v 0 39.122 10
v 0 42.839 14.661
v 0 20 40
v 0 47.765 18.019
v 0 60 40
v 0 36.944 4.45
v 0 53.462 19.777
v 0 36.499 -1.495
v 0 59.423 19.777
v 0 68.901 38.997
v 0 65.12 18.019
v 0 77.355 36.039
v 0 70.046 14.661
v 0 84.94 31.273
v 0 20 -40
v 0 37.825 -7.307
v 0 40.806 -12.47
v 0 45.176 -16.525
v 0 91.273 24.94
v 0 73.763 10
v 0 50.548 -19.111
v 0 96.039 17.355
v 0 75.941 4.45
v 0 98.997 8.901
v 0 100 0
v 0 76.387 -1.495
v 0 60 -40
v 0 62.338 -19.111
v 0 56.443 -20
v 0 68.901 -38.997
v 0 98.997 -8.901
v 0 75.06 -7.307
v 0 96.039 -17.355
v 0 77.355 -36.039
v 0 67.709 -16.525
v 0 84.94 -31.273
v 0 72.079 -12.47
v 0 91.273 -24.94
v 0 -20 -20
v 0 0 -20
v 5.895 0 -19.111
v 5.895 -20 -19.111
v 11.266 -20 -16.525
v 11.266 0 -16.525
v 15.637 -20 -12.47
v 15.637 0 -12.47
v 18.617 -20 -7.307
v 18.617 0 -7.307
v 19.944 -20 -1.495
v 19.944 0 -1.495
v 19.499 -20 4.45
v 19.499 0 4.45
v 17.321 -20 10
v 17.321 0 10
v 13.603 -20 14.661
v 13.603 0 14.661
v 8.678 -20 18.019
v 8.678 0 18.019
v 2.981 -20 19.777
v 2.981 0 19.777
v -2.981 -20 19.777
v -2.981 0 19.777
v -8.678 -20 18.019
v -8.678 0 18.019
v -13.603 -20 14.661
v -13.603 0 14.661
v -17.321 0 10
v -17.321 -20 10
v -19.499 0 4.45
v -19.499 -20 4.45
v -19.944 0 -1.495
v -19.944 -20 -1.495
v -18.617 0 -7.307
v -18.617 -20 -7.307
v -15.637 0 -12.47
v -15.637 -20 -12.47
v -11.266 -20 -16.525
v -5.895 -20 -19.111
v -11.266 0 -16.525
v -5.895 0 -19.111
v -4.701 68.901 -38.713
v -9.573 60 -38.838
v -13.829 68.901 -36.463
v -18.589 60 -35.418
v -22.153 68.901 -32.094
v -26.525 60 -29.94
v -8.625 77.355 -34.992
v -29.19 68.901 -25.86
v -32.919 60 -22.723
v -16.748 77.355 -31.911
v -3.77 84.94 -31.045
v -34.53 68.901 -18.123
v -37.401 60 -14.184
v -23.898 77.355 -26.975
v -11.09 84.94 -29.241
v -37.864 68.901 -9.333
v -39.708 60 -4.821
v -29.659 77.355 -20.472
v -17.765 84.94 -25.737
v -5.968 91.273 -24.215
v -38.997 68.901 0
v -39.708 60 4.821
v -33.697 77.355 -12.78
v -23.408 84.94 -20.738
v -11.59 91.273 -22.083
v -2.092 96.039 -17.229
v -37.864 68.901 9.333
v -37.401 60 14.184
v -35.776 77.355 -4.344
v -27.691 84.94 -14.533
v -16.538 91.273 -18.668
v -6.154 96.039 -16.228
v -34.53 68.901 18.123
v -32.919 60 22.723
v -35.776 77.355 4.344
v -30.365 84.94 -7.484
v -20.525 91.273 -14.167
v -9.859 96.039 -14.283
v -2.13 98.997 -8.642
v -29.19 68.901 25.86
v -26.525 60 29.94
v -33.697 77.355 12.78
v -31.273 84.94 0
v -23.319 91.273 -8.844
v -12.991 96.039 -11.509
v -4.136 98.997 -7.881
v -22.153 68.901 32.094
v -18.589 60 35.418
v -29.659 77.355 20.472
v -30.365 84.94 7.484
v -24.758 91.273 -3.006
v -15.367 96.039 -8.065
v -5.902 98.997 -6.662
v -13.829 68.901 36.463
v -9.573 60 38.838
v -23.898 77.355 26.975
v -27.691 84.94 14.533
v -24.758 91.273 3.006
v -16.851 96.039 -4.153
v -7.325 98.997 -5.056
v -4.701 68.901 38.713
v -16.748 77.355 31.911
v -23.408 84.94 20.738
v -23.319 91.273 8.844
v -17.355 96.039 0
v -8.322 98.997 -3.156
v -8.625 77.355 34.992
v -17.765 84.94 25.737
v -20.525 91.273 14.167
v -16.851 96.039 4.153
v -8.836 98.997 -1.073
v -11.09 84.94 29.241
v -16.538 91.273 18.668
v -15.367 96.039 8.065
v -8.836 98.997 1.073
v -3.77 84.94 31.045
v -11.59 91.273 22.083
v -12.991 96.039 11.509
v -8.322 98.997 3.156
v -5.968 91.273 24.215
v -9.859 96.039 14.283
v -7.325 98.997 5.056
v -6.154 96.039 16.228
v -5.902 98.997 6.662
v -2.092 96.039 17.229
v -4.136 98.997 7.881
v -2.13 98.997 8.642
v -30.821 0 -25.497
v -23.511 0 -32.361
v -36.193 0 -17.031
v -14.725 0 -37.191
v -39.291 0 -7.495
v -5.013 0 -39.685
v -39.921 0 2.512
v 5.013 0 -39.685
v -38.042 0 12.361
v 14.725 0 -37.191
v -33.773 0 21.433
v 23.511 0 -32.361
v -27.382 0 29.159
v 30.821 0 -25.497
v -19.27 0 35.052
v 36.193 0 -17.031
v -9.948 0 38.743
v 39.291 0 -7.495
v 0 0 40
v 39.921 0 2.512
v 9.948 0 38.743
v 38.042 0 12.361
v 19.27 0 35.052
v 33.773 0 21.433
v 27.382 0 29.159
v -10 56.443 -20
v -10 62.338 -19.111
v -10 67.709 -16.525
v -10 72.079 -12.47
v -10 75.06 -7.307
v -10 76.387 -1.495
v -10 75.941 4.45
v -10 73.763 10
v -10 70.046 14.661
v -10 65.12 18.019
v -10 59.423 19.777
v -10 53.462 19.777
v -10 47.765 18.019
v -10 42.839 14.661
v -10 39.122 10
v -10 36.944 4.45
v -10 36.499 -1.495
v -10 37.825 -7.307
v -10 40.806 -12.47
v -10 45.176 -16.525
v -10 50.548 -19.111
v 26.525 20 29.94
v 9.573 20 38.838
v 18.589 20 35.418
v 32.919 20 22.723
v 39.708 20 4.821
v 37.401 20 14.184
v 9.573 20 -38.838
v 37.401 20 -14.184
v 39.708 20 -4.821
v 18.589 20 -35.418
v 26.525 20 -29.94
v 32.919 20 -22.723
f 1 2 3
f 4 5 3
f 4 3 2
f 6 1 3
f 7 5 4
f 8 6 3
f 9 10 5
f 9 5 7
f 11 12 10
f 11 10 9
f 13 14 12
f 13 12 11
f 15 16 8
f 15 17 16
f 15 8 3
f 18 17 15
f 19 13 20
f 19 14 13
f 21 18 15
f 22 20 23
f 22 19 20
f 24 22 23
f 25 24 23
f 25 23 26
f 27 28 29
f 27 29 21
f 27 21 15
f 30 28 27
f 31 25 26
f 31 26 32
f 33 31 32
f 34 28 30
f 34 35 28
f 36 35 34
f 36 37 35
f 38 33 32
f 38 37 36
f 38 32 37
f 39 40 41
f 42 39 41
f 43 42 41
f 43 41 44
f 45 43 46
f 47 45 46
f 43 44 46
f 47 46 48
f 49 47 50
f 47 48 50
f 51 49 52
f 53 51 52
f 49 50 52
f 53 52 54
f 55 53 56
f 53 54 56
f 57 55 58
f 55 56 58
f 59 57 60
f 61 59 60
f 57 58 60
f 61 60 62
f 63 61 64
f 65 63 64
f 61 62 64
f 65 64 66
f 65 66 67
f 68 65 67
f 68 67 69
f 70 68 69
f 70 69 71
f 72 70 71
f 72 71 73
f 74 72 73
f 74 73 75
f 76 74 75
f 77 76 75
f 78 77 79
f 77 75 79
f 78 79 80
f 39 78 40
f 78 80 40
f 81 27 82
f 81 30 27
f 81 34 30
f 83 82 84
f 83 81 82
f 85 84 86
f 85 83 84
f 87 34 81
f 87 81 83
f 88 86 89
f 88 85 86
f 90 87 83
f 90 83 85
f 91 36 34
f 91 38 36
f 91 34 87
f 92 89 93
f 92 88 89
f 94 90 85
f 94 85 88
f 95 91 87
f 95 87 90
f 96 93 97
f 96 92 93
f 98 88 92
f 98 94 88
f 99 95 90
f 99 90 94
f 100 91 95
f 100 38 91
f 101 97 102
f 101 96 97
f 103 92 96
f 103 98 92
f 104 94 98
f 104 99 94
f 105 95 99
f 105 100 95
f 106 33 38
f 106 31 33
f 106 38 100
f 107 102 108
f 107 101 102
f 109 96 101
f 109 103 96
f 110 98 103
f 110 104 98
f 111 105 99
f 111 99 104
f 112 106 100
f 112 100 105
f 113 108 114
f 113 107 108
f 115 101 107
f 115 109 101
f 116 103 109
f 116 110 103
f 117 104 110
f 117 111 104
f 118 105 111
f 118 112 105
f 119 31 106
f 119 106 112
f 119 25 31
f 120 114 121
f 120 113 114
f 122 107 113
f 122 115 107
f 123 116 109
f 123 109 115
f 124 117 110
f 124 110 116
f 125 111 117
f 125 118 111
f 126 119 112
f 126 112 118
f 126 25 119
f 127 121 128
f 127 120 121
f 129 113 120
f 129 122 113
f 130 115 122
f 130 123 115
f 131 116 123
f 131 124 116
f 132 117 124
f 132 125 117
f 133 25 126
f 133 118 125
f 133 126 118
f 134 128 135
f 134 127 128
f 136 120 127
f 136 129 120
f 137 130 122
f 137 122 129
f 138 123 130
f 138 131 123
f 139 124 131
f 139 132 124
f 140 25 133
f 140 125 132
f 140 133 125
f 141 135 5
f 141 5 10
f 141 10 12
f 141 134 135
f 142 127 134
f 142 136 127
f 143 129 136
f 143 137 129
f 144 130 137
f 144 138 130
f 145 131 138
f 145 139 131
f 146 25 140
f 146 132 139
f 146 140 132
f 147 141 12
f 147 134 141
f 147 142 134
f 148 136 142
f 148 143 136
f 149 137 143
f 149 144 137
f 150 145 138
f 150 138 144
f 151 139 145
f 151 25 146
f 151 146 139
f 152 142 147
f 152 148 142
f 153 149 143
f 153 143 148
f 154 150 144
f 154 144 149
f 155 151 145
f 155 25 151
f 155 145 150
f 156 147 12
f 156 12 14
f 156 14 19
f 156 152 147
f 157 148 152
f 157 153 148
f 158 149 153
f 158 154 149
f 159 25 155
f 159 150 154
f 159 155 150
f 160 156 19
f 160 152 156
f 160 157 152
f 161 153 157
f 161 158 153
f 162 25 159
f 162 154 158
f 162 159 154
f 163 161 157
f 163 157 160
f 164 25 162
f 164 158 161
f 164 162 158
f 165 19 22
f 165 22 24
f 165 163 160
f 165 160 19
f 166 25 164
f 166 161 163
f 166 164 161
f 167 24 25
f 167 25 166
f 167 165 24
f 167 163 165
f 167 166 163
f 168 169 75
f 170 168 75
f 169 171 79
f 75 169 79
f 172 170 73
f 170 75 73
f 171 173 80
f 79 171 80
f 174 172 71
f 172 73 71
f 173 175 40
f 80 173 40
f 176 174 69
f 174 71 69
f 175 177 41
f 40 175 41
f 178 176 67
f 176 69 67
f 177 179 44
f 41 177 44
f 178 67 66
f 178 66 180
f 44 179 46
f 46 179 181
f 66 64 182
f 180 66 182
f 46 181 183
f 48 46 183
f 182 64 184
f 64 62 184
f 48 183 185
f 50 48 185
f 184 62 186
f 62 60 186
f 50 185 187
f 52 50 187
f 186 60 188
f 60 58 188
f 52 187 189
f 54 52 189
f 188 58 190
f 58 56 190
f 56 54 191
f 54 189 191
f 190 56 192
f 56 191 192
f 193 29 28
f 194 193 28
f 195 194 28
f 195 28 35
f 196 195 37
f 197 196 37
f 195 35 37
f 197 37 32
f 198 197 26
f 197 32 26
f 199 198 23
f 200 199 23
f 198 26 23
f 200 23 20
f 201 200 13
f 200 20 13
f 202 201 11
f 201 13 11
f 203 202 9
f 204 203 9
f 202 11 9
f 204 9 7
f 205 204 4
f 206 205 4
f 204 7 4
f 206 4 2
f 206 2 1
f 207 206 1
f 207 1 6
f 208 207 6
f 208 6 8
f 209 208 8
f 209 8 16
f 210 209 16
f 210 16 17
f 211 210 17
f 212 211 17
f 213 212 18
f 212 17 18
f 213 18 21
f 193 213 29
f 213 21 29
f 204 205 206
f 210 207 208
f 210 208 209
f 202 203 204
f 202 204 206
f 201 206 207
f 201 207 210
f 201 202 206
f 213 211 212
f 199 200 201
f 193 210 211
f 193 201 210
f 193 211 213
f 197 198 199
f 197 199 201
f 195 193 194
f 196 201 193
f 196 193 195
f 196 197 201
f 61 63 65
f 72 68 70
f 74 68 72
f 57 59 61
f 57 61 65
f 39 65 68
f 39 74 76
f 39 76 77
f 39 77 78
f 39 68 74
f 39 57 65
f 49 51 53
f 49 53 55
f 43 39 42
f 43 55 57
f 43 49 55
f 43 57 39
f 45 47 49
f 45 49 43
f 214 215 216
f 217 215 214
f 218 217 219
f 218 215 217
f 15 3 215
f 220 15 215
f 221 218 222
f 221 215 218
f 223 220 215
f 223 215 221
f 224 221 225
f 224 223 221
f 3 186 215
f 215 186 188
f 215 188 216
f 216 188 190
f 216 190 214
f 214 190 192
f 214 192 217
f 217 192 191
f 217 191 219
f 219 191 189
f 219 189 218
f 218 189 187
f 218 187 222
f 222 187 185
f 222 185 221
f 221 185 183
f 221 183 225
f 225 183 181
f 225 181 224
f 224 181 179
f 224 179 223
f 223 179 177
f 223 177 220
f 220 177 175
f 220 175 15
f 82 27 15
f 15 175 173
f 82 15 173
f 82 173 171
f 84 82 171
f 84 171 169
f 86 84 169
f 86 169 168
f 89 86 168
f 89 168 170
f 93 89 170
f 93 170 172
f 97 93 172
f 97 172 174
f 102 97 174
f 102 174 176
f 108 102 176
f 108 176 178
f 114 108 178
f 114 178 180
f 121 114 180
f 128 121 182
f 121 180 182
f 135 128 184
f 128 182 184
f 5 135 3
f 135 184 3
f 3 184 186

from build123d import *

# Parameters (mm, degrees)
SKETCH1_R           = 40
BOSS_EXTRUDE1_DEPTH = 100
SKETCH2_R           = 20
BOSS_EXTRUDE2_DEPTH = 20
FILLET2_R           = 40
SKETCH3_W           = 41.30426334
SKETCH3_H           = 80
CUT_EXTRUDE5_DEPTH  = 80
SKETCH5_R           = 20
CUT_EXTRUDE6_DEPTH  = 10


with BuildPart() as part:
    # Sketch1 → Boss-Extrude1 (new body)
    with BuildSketch(Plane(origin=(0, 0, 0), x_dir=(1, 0, 0), z_dir=(0, 1, 0))):
        with Locations(Location((0, 0, 0), (0, 0, 270))):
            Circle(SKETCH1_R)
    extrude(amount=BOSS_EXTRUDE1_DEPTH)

    # Sketch2 → Boss-Extrude2 (add)
    with BuildSketch(Plane.XZ):
        with Locations(Location((0, 0, 0), (0, 0, 270))):
            Circle(SKETCH2_R)
    extrude(amount=BOSS_EXTRUDE2_DEPTH)

    # Fillet2
    fillet2_edges = [part.edges().sort_by_distance(p)[0] for p in [
        (0, 100, -40),
    ]]
    fillet(fillet2_edges, radius=FILLET2_R)

    # Sketch3 → Cut-Extrude5 (cut)
    with BuildSketch(Plane(origin=(0, 100, 0), x_dir=(1, 0, 0), z_dir=(0, 1, 0))):
        with Locations((20.65213167, 0)):
            Rectangle(SKETCH3_W, SKETCH3_H)
    extrude(amount=-CUT_EXTRUDE5_DEPTH, mode=Mode.SUBTRACT)

    # Sketch5 → Cut-Extrude6 (cut)
    with BuildSketch(Plane(origin=(0, 0, 0), x_dir=(0, 0, -1), z_dir=(1, 0, 0))):
        with Locations((0, 56.442620776)):
            Circle(SKETCH5_R)
    extrude(amount=-CUT_EXTRUDE6_DEPTH, mode=Mode.SUBTRACT)


solid = part.part
